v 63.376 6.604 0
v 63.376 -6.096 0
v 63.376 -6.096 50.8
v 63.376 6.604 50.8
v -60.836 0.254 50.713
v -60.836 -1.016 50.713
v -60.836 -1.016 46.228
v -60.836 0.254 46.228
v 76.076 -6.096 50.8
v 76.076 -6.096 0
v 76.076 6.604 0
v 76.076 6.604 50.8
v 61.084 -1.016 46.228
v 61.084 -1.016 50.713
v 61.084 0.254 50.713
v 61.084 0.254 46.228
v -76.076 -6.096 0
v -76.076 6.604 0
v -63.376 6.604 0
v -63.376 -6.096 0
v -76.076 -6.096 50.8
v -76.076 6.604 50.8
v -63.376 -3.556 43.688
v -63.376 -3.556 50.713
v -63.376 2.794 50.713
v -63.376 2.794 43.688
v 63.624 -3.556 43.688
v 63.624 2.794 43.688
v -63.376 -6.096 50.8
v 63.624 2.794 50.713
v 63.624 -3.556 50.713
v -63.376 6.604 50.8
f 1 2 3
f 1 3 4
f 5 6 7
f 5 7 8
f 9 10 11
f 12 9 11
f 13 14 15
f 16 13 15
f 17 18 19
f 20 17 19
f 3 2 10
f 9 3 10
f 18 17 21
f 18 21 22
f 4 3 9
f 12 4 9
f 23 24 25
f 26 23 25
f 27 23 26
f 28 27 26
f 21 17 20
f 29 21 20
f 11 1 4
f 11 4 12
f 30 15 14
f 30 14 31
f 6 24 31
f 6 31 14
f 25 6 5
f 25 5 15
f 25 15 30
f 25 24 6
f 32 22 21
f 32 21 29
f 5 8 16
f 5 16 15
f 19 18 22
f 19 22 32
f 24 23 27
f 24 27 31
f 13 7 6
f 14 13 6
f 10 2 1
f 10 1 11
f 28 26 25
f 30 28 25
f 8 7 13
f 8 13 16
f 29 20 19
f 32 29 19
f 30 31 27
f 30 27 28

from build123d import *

# Parameters (mm, degrees)
F0_W     = 12.7
F0_H     = 12.7
F1_DEPTH = 50.8
F2_W     = 6.35
F2_H     = 7.024661
F3_DEPTH = 127
F4_T     = -2.54


with BuildPart() as f1:
    # F0 (on Top) → F1 (new body)
    with BuildSketch(Plane.XY):
        with Locations((-69.725993, 0.253999)):
            Rectangle(F0_W, F0_H)
        with Locations((69.725993, 0.253999)):
            Rectangle(F0_W, F0_H)
    extrude(amount=F1_DEPTH)


with BuildPart() as f3:
    # F2 (on face) → F3 (new body)
    with BuildSketch(Plane.YZ.offset(-63.375993)):
        with Locations((-0.381001, 47.200348)):
            Rectangle(F2_W, F2_H)
    extrude(amount=F3_DEPTH)

    # F4
    f4_openings = [f3.faces().sort_by_distance(p)[0] for p in [
        (0.124007, -0.381001, 50.712679),
    ]]
    offset(amount=F4_T, openings=f4_openings)


solid = Compound([f1.part, f3.part])
